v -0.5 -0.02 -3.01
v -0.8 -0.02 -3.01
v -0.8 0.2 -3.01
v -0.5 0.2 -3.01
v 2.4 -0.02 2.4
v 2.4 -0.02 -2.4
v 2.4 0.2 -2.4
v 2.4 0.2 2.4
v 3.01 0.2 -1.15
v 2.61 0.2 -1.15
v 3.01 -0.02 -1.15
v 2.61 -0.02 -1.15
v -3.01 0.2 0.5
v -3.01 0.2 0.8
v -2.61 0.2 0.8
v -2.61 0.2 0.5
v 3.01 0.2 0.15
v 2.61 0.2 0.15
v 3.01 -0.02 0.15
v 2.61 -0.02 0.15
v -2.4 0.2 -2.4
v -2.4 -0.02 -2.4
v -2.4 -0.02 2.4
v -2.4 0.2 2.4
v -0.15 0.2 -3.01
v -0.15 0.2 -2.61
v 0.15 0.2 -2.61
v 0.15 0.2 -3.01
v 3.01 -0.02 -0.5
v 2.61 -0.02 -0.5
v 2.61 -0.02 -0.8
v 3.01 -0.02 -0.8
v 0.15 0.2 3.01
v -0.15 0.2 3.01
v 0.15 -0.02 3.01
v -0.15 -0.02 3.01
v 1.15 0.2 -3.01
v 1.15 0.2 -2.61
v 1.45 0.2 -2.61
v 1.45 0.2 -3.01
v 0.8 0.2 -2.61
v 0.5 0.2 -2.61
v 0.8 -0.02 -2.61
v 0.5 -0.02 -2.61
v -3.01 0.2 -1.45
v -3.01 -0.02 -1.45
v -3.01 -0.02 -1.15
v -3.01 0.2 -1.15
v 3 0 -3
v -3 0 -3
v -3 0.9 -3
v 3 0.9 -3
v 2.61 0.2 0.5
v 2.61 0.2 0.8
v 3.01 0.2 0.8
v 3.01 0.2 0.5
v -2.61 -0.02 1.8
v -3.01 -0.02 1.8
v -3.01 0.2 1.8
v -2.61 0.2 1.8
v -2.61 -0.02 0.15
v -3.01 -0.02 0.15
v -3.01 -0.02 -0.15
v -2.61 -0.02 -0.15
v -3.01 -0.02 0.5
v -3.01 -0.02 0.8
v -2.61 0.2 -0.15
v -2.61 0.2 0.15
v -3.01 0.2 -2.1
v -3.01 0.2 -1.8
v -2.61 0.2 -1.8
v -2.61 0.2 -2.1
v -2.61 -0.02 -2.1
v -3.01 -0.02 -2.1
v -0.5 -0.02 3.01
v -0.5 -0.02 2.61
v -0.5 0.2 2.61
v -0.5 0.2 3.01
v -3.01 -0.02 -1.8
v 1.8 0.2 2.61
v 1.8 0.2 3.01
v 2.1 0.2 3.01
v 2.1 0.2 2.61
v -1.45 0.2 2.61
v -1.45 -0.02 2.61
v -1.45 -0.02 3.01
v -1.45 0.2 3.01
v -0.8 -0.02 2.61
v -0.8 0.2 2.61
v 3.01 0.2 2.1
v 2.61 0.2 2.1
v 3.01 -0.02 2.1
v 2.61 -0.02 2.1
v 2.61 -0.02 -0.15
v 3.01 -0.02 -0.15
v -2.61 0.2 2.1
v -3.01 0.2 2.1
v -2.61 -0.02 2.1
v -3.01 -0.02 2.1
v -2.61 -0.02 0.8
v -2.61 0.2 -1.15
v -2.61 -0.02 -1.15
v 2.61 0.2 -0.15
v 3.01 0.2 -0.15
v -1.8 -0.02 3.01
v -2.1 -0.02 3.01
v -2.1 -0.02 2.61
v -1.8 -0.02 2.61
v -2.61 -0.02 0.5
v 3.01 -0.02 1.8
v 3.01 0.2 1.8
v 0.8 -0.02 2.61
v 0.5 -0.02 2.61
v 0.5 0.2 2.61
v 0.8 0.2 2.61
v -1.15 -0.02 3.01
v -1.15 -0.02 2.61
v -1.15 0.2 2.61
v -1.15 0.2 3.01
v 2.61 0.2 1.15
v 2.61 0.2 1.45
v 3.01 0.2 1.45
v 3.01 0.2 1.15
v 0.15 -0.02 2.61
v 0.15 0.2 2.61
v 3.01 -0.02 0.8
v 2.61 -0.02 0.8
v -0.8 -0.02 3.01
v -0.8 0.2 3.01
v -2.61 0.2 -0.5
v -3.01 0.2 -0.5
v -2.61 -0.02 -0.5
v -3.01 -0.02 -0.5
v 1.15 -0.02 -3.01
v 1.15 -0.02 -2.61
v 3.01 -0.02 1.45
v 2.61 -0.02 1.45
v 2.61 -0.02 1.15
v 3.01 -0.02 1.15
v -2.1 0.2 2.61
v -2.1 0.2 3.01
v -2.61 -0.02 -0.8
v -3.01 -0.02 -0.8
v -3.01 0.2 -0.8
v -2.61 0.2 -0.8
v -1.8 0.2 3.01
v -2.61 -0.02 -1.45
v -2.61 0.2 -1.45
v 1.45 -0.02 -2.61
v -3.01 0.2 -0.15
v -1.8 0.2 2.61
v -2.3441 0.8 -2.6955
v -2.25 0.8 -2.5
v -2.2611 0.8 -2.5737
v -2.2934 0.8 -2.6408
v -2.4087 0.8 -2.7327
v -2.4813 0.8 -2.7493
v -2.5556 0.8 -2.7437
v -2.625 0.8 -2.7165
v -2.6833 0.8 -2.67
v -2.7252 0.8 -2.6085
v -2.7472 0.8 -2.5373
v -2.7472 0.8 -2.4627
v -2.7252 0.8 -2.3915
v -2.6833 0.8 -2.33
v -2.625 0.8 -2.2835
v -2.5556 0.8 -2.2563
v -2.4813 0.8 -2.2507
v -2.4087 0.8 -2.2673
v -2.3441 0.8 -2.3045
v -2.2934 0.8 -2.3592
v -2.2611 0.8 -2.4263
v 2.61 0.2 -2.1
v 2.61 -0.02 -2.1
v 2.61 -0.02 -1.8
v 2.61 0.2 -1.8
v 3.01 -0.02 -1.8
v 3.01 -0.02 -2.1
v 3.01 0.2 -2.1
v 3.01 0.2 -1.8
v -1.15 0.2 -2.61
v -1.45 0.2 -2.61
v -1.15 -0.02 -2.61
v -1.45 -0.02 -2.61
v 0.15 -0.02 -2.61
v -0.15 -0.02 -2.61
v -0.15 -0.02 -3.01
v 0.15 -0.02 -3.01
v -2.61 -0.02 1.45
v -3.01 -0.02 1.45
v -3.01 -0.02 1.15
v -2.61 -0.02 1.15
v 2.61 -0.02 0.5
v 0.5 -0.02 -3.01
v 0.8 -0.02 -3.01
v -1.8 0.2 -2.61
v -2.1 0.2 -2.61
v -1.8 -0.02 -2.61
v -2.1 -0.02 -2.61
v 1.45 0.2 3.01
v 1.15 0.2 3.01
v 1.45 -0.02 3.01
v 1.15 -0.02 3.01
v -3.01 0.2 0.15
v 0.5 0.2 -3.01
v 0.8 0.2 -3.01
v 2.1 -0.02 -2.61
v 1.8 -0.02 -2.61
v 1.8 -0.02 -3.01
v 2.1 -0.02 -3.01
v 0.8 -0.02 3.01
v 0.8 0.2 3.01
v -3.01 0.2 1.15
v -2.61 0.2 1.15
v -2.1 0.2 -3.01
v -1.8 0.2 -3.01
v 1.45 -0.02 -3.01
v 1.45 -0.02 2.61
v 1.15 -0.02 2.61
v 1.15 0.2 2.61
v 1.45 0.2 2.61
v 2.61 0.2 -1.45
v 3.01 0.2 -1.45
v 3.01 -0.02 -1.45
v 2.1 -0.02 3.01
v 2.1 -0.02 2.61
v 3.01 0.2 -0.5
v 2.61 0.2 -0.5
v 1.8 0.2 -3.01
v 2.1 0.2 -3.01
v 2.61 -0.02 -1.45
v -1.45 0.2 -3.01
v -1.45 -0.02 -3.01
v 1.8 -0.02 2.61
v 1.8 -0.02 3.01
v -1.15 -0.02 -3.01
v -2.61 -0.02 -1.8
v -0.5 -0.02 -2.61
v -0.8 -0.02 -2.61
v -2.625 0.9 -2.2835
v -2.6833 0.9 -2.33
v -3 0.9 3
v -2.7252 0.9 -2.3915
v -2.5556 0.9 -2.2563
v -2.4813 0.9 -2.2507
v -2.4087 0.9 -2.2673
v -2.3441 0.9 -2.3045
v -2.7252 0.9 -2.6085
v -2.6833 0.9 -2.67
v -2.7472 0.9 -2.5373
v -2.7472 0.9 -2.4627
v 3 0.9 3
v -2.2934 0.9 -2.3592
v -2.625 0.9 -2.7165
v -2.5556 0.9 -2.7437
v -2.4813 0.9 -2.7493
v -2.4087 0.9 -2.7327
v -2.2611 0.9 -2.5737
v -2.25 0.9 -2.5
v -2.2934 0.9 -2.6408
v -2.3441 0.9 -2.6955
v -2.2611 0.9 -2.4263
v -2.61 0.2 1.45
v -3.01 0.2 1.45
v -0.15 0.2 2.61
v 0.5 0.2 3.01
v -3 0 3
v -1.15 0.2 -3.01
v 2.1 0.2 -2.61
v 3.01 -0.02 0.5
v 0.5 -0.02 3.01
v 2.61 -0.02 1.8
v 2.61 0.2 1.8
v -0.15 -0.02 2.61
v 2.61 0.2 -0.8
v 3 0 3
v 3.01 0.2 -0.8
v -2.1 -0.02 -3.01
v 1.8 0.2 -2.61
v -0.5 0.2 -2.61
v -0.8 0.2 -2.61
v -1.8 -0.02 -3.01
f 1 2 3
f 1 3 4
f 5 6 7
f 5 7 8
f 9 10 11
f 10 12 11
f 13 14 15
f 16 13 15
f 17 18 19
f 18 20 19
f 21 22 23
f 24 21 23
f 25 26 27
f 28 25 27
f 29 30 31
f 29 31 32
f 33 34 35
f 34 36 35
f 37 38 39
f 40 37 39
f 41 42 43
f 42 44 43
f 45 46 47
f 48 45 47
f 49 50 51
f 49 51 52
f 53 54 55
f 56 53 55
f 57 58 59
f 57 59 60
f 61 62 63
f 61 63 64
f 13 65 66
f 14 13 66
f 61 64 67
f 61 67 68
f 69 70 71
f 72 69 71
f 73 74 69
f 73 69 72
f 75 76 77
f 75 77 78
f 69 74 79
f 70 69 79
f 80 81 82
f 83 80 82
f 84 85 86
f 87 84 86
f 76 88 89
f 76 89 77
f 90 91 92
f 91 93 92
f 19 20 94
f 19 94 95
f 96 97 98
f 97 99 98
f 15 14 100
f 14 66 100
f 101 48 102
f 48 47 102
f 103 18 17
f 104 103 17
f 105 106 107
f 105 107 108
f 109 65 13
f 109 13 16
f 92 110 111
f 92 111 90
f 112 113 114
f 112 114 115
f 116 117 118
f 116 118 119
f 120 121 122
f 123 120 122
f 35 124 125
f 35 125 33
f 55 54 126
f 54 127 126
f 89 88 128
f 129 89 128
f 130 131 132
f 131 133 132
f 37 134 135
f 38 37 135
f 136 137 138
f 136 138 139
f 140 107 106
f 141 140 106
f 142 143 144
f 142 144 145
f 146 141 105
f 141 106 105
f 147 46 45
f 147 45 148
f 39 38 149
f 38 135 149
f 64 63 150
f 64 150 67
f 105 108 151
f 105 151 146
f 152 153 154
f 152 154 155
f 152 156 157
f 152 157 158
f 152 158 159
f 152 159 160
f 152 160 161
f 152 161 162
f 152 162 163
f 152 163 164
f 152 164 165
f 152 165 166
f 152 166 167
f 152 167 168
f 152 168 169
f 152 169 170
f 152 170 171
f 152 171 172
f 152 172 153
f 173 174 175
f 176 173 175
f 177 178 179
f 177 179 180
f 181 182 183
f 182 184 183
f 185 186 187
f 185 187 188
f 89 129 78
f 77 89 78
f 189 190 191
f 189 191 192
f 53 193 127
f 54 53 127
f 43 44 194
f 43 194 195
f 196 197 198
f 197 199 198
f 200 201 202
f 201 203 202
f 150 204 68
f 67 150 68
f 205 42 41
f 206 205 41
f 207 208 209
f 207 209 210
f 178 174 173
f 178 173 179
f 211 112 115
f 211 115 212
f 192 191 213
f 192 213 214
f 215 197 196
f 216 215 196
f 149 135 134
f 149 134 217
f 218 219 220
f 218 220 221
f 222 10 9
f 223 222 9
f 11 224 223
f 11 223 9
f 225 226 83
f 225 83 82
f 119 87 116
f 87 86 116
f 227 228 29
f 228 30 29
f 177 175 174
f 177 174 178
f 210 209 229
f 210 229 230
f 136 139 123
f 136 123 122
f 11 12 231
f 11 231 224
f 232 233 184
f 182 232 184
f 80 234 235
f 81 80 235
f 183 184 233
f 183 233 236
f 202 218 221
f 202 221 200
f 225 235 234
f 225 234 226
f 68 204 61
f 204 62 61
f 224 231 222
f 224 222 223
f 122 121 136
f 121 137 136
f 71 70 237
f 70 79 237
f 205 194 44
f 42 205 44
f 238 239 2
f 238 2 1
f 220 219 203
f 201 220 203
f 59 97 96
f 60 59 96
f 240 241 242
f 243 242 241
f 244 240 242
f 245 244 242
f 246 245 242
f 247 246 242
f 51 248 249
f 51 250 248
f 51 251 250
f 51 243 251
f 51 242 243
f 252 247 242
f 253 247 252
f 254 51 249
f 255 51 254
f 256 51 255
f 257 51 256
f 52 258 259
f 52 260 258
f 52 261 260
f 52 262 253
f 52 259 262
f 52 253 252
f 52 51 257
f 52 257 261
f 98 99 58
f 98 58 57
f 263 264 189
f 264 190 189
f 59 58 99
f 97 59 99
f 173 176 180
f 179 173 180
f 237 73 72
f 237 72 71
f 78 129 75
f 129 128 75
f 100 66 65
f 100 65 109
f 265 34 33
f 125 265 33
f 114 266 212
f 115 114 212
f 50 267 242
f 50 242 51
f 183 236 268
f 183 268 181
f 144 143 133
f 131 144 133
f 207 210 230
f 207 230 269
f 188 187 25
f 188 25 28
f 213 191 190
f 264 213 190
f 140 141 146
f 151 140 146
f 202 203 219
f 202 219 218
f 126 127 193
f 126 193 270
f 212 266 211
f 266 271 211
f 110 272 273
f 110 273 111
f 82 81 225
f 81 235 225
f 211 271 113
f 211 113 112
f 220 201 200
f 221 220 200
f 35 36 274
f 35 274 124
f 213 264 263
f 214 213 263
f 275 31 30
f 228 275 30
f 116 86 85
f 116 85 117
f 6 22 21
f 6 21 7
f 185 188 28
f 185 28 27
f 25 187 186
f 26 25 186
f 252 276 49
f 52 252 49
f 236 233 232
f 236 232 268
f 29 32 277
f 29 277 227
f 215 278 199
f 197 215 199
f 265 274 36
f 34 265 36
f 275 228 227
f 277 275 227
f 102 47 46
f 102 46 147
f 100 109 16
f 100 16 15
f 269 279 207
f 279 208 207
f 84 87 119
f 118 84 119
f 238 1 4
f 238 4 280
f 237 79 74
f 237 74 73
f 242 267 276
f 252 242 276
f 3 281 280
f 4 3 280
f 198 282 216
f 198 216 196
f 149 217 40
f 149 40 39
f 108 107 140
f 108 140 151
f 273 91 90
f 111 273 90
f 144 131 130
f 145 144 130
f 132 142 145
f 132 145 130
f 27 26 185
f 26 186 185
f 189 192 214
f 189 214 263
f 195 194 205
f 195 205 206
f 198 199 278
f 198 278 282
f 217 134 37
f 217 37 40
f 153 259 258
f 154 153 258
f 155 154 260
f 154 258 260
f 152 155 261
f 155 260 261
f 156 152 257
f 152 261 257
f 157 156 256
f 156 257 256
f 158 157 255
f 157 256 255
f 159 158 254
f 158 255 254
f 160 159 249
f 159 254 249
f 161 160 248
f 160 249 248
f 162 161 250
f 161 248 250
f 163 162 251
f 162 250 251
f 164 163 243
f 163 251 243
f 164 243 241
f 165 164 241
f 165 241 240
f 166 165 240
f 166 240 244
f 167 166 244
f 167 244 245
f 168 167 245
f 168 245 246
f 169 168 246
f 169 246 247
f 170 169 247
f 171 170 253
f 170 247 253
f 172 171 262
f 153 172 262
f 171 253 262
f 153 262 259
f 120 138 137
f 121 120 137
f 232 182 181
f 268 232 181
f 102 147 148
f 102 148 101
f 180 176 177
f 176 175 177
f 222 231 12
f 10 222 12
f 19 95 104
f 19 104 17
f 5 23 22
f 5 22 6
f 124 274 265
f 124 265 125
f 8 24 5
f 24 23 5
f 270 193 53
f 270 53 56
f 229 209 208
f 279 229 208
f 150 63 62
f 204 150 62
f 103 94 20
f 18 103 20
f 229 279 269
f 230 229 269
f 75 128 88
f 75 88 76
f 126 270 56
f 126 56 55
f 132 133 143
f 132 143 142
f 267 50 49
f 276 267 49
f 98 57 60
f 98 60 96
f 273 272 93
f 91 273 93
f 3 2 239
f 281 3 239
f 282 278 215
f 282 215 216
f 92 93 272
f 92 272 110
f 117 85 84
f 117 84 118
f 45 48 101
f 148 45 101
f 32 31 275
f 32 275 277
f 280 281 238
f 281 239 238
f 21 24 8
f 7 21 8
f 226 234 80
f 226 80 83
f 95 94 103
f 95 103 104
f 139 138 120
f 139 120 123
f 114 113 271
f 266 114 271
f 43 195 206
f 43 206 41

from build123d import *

# Parameters (mm, degrees)
SKETCH2_W                   = 6
SKETCH2_H                   = 6
BOSS_EXTRUDE1_DEPTH         = 0.9
SKETCH3_W                   = 0.4
SKETCH3_H                   = 0.3
BOSS_EXTRUDE2_DEPTH         = 0.02
BOSS_EXTRUDE2_DEPTH_BACK    = 0.2
SKETCH3_W_2                 = 4.8
SKETCH3_H_2                 = 4.8
BOSS_EXTRUDE2_2_DEPTH       = 0.02
BOSS_EXTRUDE2_2_DEPTH_BACK  = 0.2
BOSS_EXTRUDE2_3_DEPTH       = 0.02
BOSS_EXTRUDE2_3_DEPTH_BACK  = 0.2
BOSS_EXTRUDE2_4_DEPTH       = 0.02
BOSS_EXTRUDE2_4_DEPTH_BACK  = 0.2
BOSS_EXTRUDE2_5_DEPTH       = 0.02
BOSS_EXTRUDE2_5_DEPTH_BACK  = 0.2
BOSS_EXTRUDE2_6_DEPTH       = 0.02
BOSS_EXTRUDE2_6_DEPTH_BACK  = 0.2
BOSS_EXTRUDE2_7_DEPTH       = 0.02
BOSS_EXTRUDE2_7_DEPTH_BACK  = 0.2
BOSS_EXTRUDE2_8_DEPTH       = 0.02
BOSS_EXTRUDE2_8_DEPTH_BACK  = 0.2
SKETCH3_W_3                 = 0.3
SKETCH3_H_3                 = 0.4
BOSS_EXTRUDE2_9_DEPTH       = 0.02
BOSS_EXTRUDE2_9_DEPTH_BACK  = 0.2
BOSS_EXTRUDE2_10_DEPTH      = 0.02
BOSS_EXTRUDE2_10_DEPTH_BACK = 0.2
BOSS_EXTRUDE2_11_DEPTH      = 0.02
BOSS_EXTRUDE2_11_DEPTH_BACK = 0.2
BOSS_EXTRUDE2_12_DEPTH      = 0.02
BOSS_EXTRUDE2_12_DEPTH_BACK = 0.2
BOSS_EXTRUDE2_13_DEPTH      = 0.02
BOSS_EXTRUDE2_13_DEPTH_BACK = 0.2
BOSS_EXTRUDE2_14_DEPTH      = 0.02
BOSS_EXTRUDE2_14_DEPTH_BACK = 0.2
BOSS_EXTRUDE2_15_DEPTH      = 0.02
BOSS_EXTRUDE2_15_DEPTH_BACK = 0.2
BOSS_EXTRUDE2_16_DEPTH      = 0.02
BOSS_EXTRUDE2_16_DEPTH_BACK = 0.2
BOSS_EXTRUDE2_17_DEPTH      = 0.02
BOSS_EXTRUDE2_17_DEPTH_BACK = 0.2
BOSS_EXTRUDE2_18_DEPTH      = 0.02
BOSS_EXTRUDE2_18_DEPTH_BACK = 0.2
BOSS_EXTRUDE2_19_DEPTH      = 0.02
BOSS_EXTRUDE2_19_DEPTH_BACK = 0.2
BOSS_EXTRUDE2_20_DEPTH      = 0.02
BOSS_EXTRUDE2_20_DEPTH_BACK = 0.2
BOSS_EXTRUDE2_21_DEPTH      = 0.02
BOSS_EXTRUDE2_21_DEPTH_BACK = 0.2
BOSS_EXTRUDE2_22_DEPTH      = 0.02
BOSS_EXTRUDE2_22_DEPTH_BACK = 0.2
BOSS_EXTRUDE2_23_DEPTH      = 0.02
BOSS_EXTRUDE2_23_DEPTH_BACK = 0.2
BOSS_EXTRUDE2_24_DEPTH      = 0.02
BOSS_EXTRUDE2_24_DEPTH_BACK = 0.2
BOSS_EXTRUDE2_25_DEPTH      = 0.02
BOSS_EXTRUDE2_25_DEPTH_BACK = 0.2
BOSS_EXTRUDE2_26_DEPTH      = 0.02
BOSS_EXTRUDE2_26_DEPTH_BACK = 0.2
BOSS_EXTRUDE2_27_DEPTH      = 0.02
BOSS_EXTRUDE2_27_DEPTH_BACK = 0.2
BOSS_EXTRUDE2_28_DEPTH      = 0.02
BOSS_EXTRUDE2_28_DEPTH_BACK = 0.2
BOSS_EXTRUDE2_29_DEPTH      = 0.02
BOSS_EXTRUDE2_29_DEPTH_BACK = 0.2
SKETCH4_R                   = 0.25
CUT_EXTRUDE1_DEPTH          = 0.1


with BuildPart() as part:
    # Sketch2 → Boss-Extrude1 (new body)
    with BuildSketch(Plane(origin=(0, 0, 0), x_dir=(1, 0, 0), z_dir=(0, 1, 0))):
        Rectangle(SKETCH2_W, SKETCH2_H)
    extrude(amount=BOSS_EXTRUDE1_DEPTH)

    # Sketch4 → Cut-Extrude1 (cut)
    with BuildSketch(Plane(origin=(0, 0.9, 0), x_dir=(1, 0, 0), z_dir=(0, 1, 0))):
        with Locations((-2.5, 2.5)):
            Circle(SKETCH4_R)
    extrude(amount=-CUT_EXTRUDE1_DEPTH, mode=Mode.SUBTRACT)


with BuildPart() as body_2:
    # Sketch3 → Boss-Extrude2 (new body, two sides)
    with BuildSketch(Plane.XZ) as boss_extrude2_sk:
        with Locations((-2.81, 0.65)):
            Rectangle(SKETCH3_W, SKETCH3_H)
    extrude(amount=BOSS_EXTRUDE2_DEPTH)
    extrude(boss_extrude2_sk.sketch, amount=-BOSS_EXTRUDE2_DEPTH_BACK)


with BuildPart() as body_3:
    # Sketch3 → Boss-Extrude2 2 (new body, two sides)
    with BuildSketch(Plane.XZ) as boss_extrude2_2_sk:
        Rectangle(SKETCH3_W_2, SKETCH3_H_2)
    extrude(amount=BOSS_EXTRUDE2_2_DEPTH)
    extrude(boss_extrude2_2_sk.sketch, amount=-BOSS_EXTRUDE2_2_DEPTH_BACK)


with BuildPart() as body_4:
    # Sketch3 → Boss-Extrude2 3 (new body, two sides)
    with BuildSketch(Plane.XZ) as boss_extrude2_3_sk:
        with Locations((-2.81, 0)):
            Rectangle(SKETCH3_W, SKETCH3_H)
    extrude(amount=BOSS_EXTRUDE2_3_DEPTH)
    extrude(boss_extrude2_3_sk.sketch, amount=-BOSS_EXTRUDE2_3_DEPTH_BACK)


with BuildPart() as body_5:
    # Sketch3 → Boss-Extrude2 4 (new body, two sides)
    with BuildSketch(Plane.XZ) as boss_extrude2_4_sk:
        with Locations((-2.81, 1.3)):
            Rectangle(SKETCH3_W, SKETCH3_H)
    extrude(amount=BOSS_EXTRUDE2_4_DEPTH)
    extrude(boss_extrude2_4_sk.sketch, amount=-BOSS_EXTRUDE2_4_DEPTH_BACK)


with BuildPart() as body_6:
    # Sketch3 → Boss-Extrude2 5 (new body, two sides)
    with BuildSketch(Plane.XZ) as boss_extrude2_5_sk:
        with Locations((-2.81, 1.95)):
            Rectangle(SKETCH3_W, SKETCH3_H)
    extrude(amount=BOSS_EXTRUDE2_5_DEPTH)
    extrude(boss_extrude2_5_sk.sketch, amount=-BOSS_EXTRUDE2_5_DEPTH_BACK)


with BuildPart() as body_7:
    # Sketch3 → Boss-Extrude2 6 (new body, two sides)
    with BuildSketch(Plane.XZ) as boss_extrude2_6_sk:
        with Locations((-2.81, -1.95)):
            Rectangle(SKETCH3_W, SKETCH3_H)
    extrude(amount=BOSS_EXTRUDE2_6_DEPTH)
    extrude(boss_extrude2_6_sk.sketch, amount=-BOSS_EXTRUDE2_6_DEPTH_BACK)


with BuildPart() as body_8:
    # Sketch3 → Boss-Extrude2 7 (new body, two sides)
    with BuildSketch(Plane.XZ) as boss_extrude2_7_sk:
        with Locations((-2.81, -1.3)):
            Rectangle(SKETCH3_W, SKETCH3_H)
    extrude(amount=BOSS_EXTRUDE2_7_DEPTH)
    extrude(boss_extrude2_7_sk.sketch, amount=-BOSS_EXTRUDE2_7_DEPTH_BACK)


with BuildPart() as body_9:
    # Sketch3 → Boss-Extrude2 8 (new body, two sides)
    with BuildSketch(Plane.XZ) as boss_extrude2_8_sk:
        with Locations((-2.81, -0.65)):
            Rectangle(SKETCH3_W, SKETCH3_H)
    extrude(amount=BOSS_EXTRUDE2_8_DEPTH)
    extrude(boss_extrude2_8_sk.sketch, amount=-BOSS_EXTRUDE2_8_DEPTH_BACK)


with BuildPart() as body_10:
    # Sketch3 → Boss-Extrude2 9 (new body, two sides)
    with BuildSketch(Plane.XZ) as boss_extrude2_9_sk:
        with Locations((1.95, 2.81)):
            Rectangle(SKETCH3_W_3, SKETCH3_H_3)
    extrude(amount=BOSS_EXTRUDE2_9_DEPTH)
    extrude(boss_extrude2_9_sk.sketch, amount=-BOSS_EXTRUDE2_9_DEPTH_BACK)


with BuildPart() as body_11:
    # Sketch3 → Boss-Extrude2 10 (new body, two sides)
    with BuildSketch(Plane.XZ) as boss_extrude2_10_sk:
        with Locations((1.3, 2.81)):
            Rectangle(SKETCH3_W_3, SKETCH3_H_3)
    extrude(amount=BOSS_EXTRUDE2_10_DEPTH)
    extrude(boss_extrude2_10_sk.sketch, amount=-BOSS_EXTRUDE2_10_DEPTH_BACK)


with BuildPart() as body_12:
    # Sketch3 → Boss-Extrude2 11 (new body, two sides)
    with BuildSketch(Plane.XZ) as boss_extrude2_11_sk:
        with Locations((0.65, 2.81)):
            Rectangle(SKETCH3_W_3, SKETCH3_H_3)
    extrude(amount=BOSS_EXTRUDE2_11_DEPTH)
    extrude(boss_extrude2_11_sk.sketch, amount=-BOSS_EXTRUDE2_11_DEPTH_BACK)


with BuildPart() as body_13:
    # Sketch3 → Boss-Extrude2 12 (new body, two sides)
    with BuildSketch(Plane.XZ) as boss_extrude2_12_sk:
        with Locations((0, 2.81)):
            Rectangle(SKETCH3_W_3, SKETCH3_H_3)
    extrude(amount=BOSS_EXTRUDE2_12_DEPTH)
    extrude(boss_extrude2_12_sk.sketch, amount=-BOSS_EXTRUDE2_12_DEPTH_BACK)


with BuildPart() as body_14:
    # Sketch3 → Boss-Extrude2 13 (new body, two sides)
    with BuildSketch(Plane.XZ) as boss_extrude2_13_sk:
        with Locations((-0.65, 2.81)):
            Rectangle(SKETCH3_W_3, SKETCH3_H_3)
    extrude(amount=BOSS_EXTRUDE2_13_DEPTH)
    extrude(boss_extrude2_13_sk.sketch, amount=-BOSS_EXTRUDE2_13_DEPTH_BACK)


with BuildPart() as body_15:
    # Sketch3 → Boss-Extrude2 14 (new body, two sides)
    with BuildSketch(Plane.XZ) as boss_extrude2_14_sk:
        with Locations((-1.3, 2.81)):
            Rectangle(SKETCH3_W_3, SKETCH3_H_3)
    extrude(amount=BOSS_EXTRUDE2_14_DEPTH)
    extrude(boss_extrude2_14_sk.sketch, amount=-BOSS_EXTRUDE2_14_DEPTH_BACK)


with BuildPart() as body_16:
    # Sketch3 → Boss-Extrude2 15 (new body, two sides)
    with BuildSketch(Plane.XZ) as boss_extrude2_15_sk:
        with Locations((-1.95, 2.81)):
            Rectangle(SKETCH3_W_3, SKETCH3_H_3)
    extrude(amount=BOSS_EXTRUDE2_15_DEPTH)
    extrude(boss_extrude2_15_sk.sketch, amount=-BOSS_EXTRUDE2_15_DEPTH_BACK)


with BuildPart() as body_17:
    # Sketch3 → Boss-Extrude2 16 (new body, two sides)
    with BuildSketch(Plane.XZ) as boss_extrude2_16_sk:
        with Locations((2.81, -1.95)):
            Rectangle(SKETCH3_W, SKETCH3_H)
    extrude(amount=BOSS_EXTRUDE2_16_DEPTH)
    extrude(boss_extrude2_16_sk.sketch, amount=-BOSS_EXTRUDE2_16_DEPTH_BACK)


with BuildPart() as body_18:
    # Sketch3 → Boss-Extrude2 17 (new body, two sides)
    with BuildSketch(Plane.XZ) as boss_extrude2_17_sk:
        with Locations((2.81, -1.3)):
            Rectangle(SKETCH3_W, SKETCH3_H)
    extrude(amount=BOSS_EXTRUDE2_17_DEPTH)
    extrude(boss_extrude2_17_sk.sketch, amount=-BOSS_EXTRUDE2_17_DEPTH_BACK)


with BuildPart() as body_19:
    # Sketch3 → Boss-Extrude2 18 (new body, two sides)
    with BuildSketch(Plane.XZ) as boss_extrude2_18_sk:
        with Locations((2.81, -0.65)):
            Rectangle(SKETCH3_W, SKETCH3_H)
    extrude(amount=BOSS_EXTRUDE2_18_DEPTH)
    extrude(boss_extrude2_18_sk.sketch, amount=-BOSS_EXTRUDE2_18_DEPTH_BACK)


with BuildPart() as body_20:
    # Sketch3 → Boss-Extrude2 19 (new body, two sides)
    with BuildSketch(Plane.XZ) as boss_extrude2_19_sk:
        with Locations((2.81, 0)):
            Rectangle(SKETCH3_W, SKETCH3_H)
    extrude(amount=BOSS_EXTRUDE2_19_DEPTH)
    extrude(boss_extrude2_19_sk.sketch, amount=-BOSS_EXTRUDE2_19_DEPTH_BACK)


with BuildPart() as body_21:
    # Sketch3 → Boss-Extrude2 20 (new body, two sides)
    with BuildSketch(Plane.XZ) as boss_extrude2_20_sk:
        with Locations((2.81, 0.65)):
            Rectangle(SKETCH3_W, SKETCH3_H)
    extrude(amount=BOSS_EXTRUDE2_20_DEPTH)
    extrude(boss_extrude2_20_sk.sketch, amount=-BOSS_EXTRUDE2_20_DEPTH_BACK)


with BuildPart() as body_22:
    # Sketch3 → Boss-Extrude2 21 (new body, two sides)
    with BuildSketch(Plane.XZ) as boss_extrude2_21_sk:
        with Locations((2.81, 1.3)):
            Rectangle(SKETCH3_W, SKETCH3_H)
    extrude(amount=BOSS_EXTRUDE2_21_DEPTH)
    extrude(boss_extrude2_21_sk.sketch, amount=-BOSS_EXTRUDE2_21_DEPTH_BACK)


with BuildPart() as body_23:
    # Sketch3 → Boss-Extrude2 22 (new body, two sides)
    with BuildSketch(Plane.XZ) as boss_extrude2_22_sk:
        with Locations((2.81, 1.95)):
            Rectangle(SKETCH3_W, SKETCH3_H)
    extrude(amount=BOSS_EXTRUDE2_22_DEPTH)
    extrude(boss_extrude2_22_sk.sketch, amount=-BOSS_EXTRUDE2_22_DEPTH_BACK)


with BuildPart() as body_24:
    # Sketch3 → Boss-Extrude2 23 (new body, two sides)
    with BuildSketch(Plane.XZ) as boss_extrude2_23_sk:
        with Locations((-1.95, -2.81)):
            Rectangle(SKETCH3_W_3, SKETCH3_H_3)
    extrude(amount=BOSS_EXTRUDE2_23_DEPTH)
    extrude(boss_extrude2_23_sk.sketch, amount=-BOSS_EXTRUDE2_23_DEPTH_BACK)


with BuildPart() as body_25:
    # Sketch3 → Boss-Extrude2 24 (new body, two sides)
    with BuildSketch(Plane.XZ) as boss_extrude2_24_sk:
        with Locations((-1.3, -2.81)):
            Rectangle(SKETCH3_W_3, SKETCH3_H_3)
    extrude(amount=BOSS_EXTRUDE2_24_DEPTH)
    extrude(boss_extrude2_24_sk.sketch, amount=-BOSS_EXTRUDE2_24_DEPTH_BACK)


with BuildPart() as body_26:
    # Sketch3 → Boss-Extrude2 25 (new body, two sides)
    with BuildSketch(Plane.XZ) as boss_extrude2_25_sk:
        with Locations((-0.65, -2.81)):
            Rectangle(SKETCH3_W_3, SKETCH3_H_3)
    extrude(amount=BOSS_EXTRUDE2_25_DEPTH)
    extrude(boss_extrude2_25_sk.sketch, amount=-BOSS_EXTRUDE2_25_DEPTH_BACK)


with BuildPart() as body_27:
    # Sketch3 → Boss-Extrude2 26 (new body, two sides)
    with BuildSketch(Plane.XZ) as boss_extrude2_26_sk:
        with Locations((0, -2.81)):
            Rectangle(SKETCH3_W_3, SKETCH3_H_3)
    extrude(amount=BOSS_EXTRUDE2_26_DEPTH)
    extrude(boss_extrude2_26_sk.sketch, amount=-BOSS_EXTRUDE2_26_DEPTH_BACK)


with BuildPart() as body_28:
    # Sketch3 → Boss-Extrude2 27 (new body, two sides)
    with BuildSketch(Plane.XZ) as boss_extrude2_27_sk:
        with Locations((0.65, -2.81)):
            Rectangle(SKETCH3_W_3, SKETCH3_H_3)
    extrude(amount=BOSS_EXTRUDE2_27_DEPTH)
    extrude(boss_extrude2_27_sk.sketch, amount=-BOSS_EXTRUDE2_27_DEPTH_BACK)


with BuildPart() as body_29:
    # Sketch3 → Boss-Extrude2 28 (new body, two sides)
    with BuildSketch(Plane.XZ) as boss_extrude2_28_sk:
        with Locations((1.3, -2.81)):
            Rectangle(SKETCH3_W_3, SKETCH3_H_3)
    extrude(amount=BOSS_EXTRUDE2_28_DEPTH)
    extrude(boss_extrude2_28_sk.sketch, amount=-BOSS_EXTRUDE2_28_DEPTH_BACK)


with BuildPart() as body_30:
    # Sketch3 → Boss-Extrude2 29 (new body, two sides)
    with BuildSketch(Plane.XZ) as boss_extrude2_29_sk:
        with Locations((1.95, -2.81)):
            Rectangle(SKETCH3_W_3, SKETCH3_H_3)
    extrude(amount=BOSS_EXTRUDE2_29_DEPTH)
    extrude(boss_extrude2_29_sk.sketch, amount=-BOSS_EXTRUDE2_29_DEPTH_BACK)


solid = Compound([part.part, body_2.part, body_3.part, body_4.part, body_5.part, body_6.part, body_7.part, body_8.part, body_9.part, body_10.part, body_11.part, body_12.part, body_13.part, body_14.part, body_15.part, body_16.part, body_17.part, body_18.part, body_19.part, body_20.part, body_21.part, body_22.part, body_23.part, body_24.part, body_25.part, body_26.part, body_27.part, body_28.part, body_29.part, body_30.part])
